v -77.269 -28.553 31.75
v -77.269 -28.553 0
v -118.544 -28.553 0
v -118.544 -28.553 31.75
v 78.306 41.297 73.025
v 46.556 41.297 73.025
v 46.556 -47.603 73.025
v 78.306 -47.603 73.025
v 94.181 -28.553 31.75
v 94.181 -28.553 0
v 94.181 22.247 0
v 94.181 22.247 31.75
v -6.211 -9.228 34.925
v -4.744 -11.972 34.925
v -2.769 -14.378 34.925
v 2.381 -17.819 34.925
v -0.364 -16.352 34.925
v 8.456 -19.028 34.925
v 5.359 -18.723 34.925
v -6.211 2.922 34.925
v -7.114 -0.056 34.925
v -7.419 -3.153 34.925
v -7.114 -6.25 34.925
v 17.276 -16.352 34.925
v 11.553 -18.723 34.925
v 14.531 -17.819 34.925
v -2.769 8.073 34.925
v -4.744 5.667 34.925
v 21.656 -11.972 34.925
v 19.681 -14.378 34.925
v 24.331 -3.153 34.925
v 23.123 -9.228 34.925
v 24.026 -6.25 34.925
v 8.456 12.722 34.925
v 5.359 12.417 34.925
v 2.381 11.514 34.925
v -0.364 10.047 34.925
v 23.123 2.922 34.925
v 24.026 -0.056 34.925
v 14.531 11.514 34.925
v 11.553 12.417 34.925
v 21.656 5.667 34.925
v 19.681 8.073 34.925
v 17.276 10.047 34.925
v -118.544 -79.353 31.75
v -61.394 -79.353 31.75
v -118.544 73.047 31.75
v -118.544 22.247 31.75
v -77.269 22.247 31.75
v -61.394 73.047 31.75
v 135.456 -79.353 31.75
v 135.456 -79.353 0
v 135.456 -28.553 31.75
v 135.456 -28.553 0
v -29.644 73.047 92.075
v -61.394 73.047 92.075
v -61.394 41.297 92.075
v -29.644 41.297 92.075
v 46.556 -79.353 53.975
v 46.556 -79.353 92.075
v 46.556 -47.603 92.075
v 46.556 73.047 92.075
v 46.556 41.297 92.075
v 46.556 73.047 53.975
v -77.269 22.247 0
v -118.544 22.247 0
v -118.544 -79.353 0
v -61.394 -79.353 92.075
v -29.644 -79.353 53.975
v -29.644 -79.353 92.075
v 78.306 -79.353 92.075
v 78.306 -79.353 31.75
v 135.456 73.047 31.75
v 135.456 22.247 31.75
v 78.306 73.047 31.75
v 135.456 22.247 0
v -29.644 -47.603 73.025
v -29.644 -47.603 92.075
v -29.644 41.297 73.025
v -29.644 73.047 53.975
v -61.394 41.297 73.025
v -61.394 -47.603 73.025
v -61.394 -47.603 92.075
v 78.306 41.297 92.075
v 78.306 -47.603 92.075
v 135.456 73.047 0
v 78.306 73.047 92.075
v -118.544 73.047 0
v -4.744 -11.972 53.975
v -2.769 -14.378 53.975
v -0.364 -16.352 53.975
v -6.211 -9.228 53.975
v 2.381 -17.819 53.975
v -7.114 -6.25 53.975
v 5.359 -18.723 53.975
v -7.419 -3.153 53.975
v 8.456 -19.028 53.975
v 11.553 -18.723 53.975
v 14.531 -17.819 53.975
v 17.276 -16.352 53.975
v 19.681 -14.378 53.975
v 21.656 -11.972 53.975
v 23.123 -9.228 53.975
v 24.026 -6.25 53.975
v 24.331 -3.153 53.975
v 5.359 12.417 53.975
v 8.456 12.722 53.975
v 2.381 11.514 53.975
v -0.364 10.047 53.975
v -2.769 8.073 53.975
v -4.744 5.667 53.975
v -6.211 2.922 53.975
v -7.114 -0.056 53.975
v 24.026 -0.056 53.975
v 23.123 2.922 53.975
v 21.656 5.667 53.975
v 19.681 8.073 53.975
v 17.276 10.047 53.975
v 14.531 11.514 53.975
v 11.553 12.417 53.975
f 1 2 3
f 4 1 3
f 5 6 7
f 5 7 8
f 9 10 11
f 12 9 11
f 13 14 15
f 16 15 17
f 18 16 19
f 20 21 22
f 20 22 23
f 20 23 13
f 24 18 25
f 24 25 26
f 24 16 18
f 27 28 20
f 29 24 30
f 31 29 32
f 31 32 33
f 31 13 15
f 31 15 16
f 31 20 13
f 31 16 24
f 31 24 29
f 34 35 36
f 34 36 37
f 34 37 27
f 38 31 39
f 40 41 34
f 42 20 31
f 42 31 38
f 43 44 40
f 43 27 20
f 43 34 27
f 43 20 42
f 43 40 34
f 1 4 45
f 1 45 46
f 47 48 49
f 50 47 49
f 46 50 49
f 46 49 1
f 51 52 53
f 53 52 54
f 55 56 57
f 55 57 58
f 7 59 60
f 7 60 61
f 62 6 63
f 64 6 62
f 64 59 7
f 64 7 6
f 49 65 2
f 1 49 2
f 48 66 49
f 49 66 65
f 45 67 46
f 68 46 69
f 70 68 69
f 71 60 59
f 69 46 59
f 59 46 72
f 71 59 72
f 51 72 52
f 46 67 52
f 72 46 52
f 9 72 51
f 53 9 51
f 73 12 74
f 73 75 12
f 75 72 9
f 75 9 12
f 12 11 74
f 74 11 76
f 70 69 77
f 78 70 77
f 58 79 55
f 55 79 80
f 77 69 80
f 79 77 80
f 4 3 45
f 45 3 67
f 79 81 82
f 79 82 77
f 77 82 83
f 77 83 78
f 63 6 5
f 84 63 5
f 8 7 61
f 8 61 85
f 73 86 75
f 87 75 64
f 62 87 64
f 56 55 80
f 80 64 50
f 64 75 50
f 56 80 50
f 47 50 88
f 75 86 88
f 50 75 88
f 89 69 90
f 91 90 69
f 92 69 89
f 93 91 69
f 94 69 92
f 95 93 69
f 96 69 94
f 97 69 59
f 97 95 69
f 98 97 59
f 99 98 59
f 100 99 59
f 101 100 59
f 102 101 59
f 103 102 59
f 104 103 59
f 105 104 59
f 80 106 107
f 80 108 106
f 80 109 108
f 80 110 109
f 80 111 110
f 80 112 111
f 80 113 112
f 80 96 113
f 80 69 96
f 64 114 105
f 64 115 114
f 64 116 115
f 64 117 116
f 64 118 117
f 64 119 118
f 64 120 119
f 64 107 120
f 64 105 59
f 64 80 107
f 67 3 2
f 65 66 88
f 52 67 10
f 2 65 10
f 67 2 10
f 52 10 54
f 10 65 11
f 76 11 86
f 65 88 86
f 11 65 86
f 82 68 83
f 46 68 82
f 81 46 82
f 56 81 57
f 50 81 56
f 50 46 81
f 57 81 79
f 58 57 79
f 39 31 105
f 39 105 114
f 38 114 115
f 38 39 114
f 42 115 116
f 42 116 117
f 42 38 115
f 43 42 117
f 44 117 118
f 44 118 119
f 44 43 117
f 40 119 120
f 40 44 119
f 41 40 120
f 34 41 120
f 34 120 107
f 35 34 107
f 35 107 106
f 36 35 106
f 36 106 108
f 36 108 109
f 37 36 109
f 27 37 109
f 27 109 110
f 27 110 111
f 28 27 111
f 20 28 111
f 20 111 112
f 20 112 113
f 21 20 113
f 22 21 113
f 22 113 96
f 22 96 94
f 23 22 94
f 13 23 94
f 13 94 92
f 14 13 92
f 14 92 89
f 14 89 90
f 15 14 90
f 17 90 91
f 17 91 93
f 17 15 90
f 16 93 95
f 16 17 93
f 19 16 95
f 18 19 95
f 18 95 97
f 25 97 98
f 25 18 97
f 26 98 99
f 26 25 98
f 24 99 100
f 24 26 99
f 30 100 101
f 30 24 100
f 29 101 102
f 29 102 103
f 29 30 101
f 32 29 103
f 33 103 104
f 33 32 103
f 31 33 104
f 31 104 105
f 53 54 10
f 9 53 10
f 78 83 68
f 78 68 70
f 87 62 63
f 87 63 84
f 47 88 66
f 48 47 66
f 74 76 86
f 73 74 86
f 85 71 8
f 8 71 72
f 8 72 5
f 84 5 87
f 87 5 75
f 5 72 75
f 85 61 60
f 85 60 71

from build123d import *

# Parameters (mm, degrees)
F0_W     = 31.75
F0_H     = 31.75
F1_DEPTH = 92.075
F0_R     = 15.875
F2_DEPTH = 53.975
F3_DEPTH = 34.925
F0_H_2   = 88.9
F4_DEPTH = 73.025
F5_DEPTH = 31.75


with BuildPart() as f1:
    # F0 (on Top) → F1 (new body)
    with BuildSketch(Plane.XY):
        with Locations((-45.519012, 57.172301)):
            Rectangle(F0_W, F0_H)
        with Locations((-45.519012, -63.477699)):
            Rectangle(F0_W, F0_H)
        with Locations((62.430988, 57.172301)):
            Rectangle(F0_W, F0_H)
        with Locations((62.430988, -63.477699)):
            Rectangle(F0_W, F0_H)
    extrude(amount=F1_DEPTH)

    # F0 (on Top) → F2 (join)
    with BuildSketch(Plane.XY):
        Polygon((-29.644012, -47.602699), (-29.644012, -79.352699), (46.555988, -79.352699), (46.555988, -47.602699), (46.555988, 41.297301), (46.555988, 73.047301), (-29.644012, 73.047301), (-29.644012, 41.297301), align=None)
        with Locations((8.455988, -3.152699)):
            Circle(F0_R, mode=Mode.SUBTRACT)
    extrude(amount=F2_DEPTH)

    # F0 (on Top) → F3 (join)
    with BuildSketch(Plane.XY):
        with Locations((8.455988, -3.152699)):
            Circle(F0_R)
    extrude(amount=F3_DEPTH)



with BuildPart() as f4:
    # F0 (on Top) → F4 (new body)
    with BuildSketch(Plane.XY):
        with Locations((-45.519012, -3.152699)):
            Rectangle(F0_W, F0_H_2)
        with Locations((62.430988, -3.152699)):
            Rectangle(F0_W, F0_H_2)
    extrude(amount=F4_DEPTH)


with BuildPart() as f1_1:
    add(f1.part)

    add(f4.part)  # F5 merges F4
    # F0 (on Top) → F5 (join)
    with BuildSketch(Plane.XY):
        Polygon((-118.544012, -28.552699), (-118.544012, -79.352699), (-61.394012, -79.352699), (-61.394012, -47.602699), (-61.394012, 41.297301), (-61.394012, 73.047301), (-118.544012, 73.047301), (-118.544012, 22.247301), (-77.269012, 22.247301), (-77.269012, -28.552699), align=None)
        Polygon((78.305988, -47.602699), (78.305988, -79.352699), (135.455988, -79.352699), (135.455988, -28.552699), (94.180988, -28.552699), (94.180988, 22.247301), (135.455988, 22.247301), (135.455988, 73.047301), (78.305988, 73.047301), (78.305988, 41.297301), align=None)
    extrude(amount=F5_DEPTH)


solid = f1_1.part
